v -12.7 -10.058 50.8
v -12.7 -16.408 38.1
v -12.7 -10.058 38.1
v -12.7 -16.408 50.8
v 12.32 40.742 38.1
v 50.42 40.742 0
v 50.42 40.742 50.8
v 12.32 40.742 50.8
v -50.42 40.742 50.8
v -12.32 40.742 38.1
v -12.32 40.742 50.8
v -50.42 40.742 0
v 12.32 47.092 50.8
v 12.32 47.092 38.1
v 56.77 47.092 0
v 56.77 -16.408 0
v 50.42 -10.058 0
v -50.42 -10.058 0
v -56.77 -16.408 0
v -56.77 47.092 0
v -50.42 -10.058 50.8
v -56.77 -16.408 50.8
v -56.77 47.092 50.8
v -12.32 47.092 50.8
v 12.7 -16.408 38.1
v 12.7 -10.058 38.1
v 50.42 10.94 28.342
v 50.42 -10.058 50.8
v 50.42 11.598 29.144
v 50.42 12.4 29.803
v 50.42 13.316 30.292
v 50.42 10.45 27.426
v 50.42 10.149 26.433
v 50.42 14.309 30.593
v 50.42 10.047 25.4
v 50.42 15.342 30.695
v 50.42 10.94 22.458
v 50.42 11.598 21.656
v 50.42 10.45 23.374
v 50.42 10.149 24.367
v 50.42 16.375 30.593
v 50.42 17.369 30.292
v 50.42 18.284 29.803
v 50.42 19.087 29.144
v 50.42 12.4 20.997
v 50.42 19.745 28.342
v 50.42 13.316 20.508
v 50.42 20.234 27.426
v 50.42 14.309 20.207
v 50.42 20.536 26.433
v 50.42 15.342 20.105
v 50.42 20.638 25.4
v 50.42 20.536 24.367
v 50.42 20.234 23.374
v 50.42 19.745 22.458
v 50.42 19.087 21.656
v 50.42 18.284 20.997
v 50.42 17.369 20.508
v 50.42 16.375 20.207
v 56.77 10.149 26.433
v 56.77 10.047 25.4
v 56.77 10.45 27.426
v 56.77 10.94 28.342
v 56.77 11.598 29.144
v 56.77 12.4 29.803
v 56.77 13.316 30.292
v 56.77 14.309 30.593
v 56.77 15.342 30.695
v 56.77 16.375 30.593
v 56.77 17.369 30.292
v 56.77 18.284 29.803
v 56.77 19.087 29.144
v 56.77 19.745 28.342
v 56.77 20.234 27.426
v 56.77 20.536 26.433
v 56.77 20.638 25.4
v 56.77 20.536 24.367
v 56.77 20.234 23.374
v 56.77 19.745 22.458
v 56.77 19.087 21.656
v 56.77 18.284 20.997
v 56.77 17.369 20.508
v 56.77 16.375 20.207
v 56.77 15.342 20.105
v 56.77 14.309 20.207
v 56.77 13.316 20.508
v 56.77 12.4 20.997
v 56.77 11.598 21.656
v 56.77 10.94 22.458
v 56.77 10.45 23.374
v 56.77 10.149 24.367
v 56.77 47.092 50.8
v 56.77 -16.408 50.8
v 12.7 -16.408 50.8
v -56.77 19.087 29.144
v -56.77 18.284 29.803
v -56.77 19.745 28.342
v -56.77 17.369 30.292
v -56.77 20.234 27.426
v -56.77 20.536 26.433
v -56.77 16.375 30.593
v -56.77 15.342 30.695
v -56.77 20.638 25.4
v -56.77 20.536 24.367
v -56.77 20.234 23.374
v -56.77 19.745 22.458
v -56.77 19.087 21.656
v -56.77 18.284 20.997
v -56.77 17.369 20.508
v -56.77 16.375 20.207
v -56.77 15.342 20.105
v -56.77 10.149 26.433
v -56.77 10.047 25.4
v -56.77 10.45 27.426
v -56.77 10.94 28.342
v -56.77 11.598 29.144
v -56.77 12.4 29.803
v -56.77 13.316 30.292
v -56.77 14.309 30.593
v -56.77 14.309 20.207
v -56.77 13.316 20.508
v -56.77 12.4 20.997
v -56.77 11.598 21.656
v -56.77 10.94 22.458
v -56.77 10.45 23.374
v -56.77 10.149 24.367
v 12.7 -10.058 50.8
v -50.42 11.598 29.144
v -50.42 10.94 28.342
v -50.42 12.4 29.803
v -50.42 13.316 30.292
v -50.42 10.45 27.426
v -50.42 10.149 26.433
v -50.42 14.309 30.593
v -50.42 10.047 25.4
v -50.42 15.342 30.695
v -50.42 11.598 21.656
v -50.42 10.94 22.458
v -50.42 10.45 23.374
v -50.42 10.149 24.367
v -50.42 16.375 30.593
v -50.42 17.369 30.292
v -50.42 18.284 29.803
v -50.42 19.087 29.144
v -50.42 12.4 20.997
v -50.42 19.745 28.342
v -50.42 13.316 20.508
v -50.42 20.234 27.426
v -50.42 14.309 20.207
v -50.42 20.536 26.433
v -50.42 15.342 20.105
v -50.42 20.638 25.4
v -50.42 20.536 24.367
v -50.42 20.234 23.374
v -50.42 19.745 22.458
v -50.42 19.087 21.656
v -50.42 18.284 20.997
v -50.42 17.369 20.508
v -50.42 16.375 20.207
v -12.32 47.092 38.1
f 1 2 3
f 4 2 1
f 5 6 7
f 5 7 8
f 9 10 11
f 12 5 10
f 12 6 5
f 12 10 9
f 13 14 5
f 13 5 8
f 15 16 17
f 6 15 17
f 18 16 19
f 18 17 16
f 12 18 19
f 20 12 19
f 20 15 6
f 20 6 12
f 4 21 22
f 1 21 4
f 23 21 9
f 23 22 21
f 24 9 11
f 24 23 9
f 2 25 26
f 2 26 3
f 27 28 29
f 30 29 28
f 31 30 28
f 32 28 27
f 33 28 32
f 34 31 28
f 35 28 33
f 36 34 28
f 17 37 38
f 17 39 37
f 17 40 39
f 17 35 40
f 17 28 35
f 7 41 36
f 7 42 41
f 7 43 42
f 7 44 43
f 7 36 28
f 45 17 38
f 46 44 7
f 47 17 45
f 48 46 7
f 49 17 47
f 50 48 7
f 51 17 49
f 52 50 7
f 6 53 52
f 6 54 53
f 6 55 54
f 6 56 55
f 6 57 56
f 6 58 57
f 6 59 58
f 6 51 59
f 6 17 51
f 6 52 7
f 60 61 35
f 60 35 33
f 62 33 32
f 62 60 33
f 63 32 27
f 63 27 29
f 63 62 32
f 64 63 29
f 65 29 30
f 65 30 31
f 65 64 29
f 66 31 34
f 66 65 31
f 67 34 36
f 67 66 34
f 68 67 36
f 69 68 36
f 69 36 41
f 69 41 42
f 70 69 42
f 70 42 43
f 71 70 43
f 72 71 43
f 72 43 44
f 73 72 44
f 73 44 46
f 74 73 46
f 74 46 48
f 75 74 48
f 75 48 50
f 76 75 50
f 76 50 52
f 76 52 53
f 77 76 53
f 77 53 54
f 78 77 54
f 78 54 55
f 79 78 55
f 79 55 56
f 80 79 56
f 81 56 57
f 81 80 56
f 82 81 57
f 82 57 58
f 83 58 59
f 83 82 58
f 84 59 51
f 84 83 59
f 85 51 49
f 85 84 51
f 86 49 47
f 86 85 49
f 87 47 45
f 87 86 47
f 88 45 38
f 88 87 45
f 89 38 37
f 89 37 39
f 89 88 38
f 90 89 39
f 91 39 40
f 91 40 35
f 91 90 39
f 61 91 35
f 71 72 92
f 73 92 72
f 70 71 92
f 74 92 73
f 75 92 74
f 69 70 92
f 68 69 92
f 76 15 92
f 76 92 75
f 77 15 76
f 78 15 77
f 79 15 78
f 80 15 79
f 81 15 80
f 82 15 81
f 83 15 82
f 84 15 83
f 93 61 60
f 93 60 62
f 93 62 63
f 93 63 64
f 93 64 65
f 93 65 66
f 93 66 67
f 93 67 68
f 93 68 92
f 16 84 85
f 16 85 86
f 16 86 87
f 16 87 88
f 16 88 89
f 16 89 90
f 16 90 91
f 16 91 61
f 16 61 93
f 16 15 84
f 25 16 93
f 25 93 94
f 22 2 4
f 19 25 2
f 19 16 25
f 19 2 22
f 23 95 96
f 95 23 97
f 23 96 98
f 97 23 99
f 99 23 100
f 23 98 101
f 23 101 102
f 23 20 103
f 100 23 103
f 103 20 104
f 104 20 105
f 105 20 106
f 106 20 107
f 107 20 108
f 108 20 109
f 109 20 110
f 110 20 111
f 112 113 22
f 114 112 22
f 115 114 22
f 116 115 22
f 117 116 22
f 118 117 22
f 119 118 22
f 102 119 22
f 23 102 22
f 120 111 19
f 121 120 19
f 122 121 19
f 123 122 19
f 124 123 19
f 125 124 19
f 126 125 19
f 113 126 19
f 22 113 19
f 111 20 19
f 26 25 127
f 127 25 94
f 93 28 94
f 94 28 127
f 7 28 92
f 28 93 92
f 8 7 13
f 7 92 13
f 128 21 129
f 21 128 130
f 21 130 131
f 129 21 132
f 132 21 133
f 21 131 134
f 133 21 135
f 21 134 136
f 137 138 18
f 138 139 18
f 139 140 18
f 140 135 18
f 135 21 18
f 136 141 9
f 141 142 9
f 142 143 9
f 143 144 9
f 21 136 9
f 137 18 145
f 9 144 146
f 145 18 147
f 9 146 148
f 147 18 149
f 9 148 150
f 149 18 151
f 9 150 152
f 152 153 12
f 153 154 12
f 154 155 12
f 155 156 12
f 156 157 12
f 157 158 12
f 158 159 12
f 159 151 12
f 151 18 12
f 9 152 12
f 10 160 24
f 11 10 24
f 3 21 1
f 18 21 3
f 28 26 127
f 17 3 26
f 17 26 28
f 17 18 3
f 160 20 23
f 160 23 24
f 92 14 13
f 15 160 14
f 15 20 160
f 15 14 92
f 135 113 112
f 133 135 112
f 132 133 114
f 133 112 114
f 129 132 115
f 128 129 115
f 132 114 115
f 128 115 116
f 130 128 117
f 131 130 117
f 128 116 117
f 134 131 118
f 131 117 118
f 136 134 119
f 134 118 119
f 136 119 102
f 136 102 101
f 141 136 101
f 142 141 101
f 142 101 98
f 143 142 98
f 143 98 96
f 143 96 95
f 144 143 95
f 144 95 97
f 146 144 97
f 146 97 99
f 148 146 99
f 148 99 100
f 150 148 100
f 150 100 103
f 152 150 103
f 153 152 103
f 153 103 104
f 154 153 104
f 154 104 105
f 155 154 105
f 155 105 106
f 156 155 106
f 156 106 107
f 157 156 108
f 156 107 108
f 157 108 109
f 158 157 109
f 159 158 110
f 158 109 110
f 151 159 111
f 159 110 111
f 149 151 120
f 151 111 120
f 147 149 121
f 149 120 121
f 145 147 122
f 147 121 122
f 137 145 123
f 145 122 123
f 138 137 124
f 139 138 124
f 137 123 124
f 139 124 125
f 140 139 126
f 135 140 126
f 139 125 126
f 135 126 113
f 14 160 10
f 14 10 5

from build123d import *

# Parameters (mm, degrees)
F1_DEPTH = 50.8
F2_W     = 12.7
F2_H     = 12.7
F4_DEPTH = 25.4
F3_W     = 12.7
F3_H     = 12.7
F5_DEPTH = 25.4
F6_R     = 5.295209
F7_DEPTH = 25.4


with BuildPart() as f1:
    # F0 (on Top) → F1 (new body)
    with BuildSketch(Plane.XY):
        Polygon((-50.420101, -10.057684), (-50.420101, 40.742316), (0.379899, 40.742316), (0.379899, 47.092316), (-56.770101, 47.092316), (-56.770101, 15.342316), (-56.770101, -16.407684), (0, -16.407684), (0, -10.057684), align=None)
    extrude(amount=F1_DEPTH)

    # F2 (on face) → F4 (cut)
    with BuildSketch(Plane.XZ.offset(16.407684)):
        with Locations((-6.35, 44.45)):
            Rectangle(F2_W, F2_H)
    extrude(amount=-F4_DEPTH, mode=Mode.SUBTRACT)

    # F3 (on face) → F5 (cut)
    with BuildSketch(Plane(origin=(0, 47.092316, 0), x_dir=(-1, 0, 0), z_dir=(0, 1, 0))):
        with Locations((5.970101, 44.45)):
            Rectangle(F3_W, F3_H)
    extrude(amount=-F5_DEPTH, mode=Mode.SUBTRACT)

    # F6 (on face) → F7 (cut)
    with BuildSketch(Plane(origin=(-56.770101, 0, 0), x_dir=(0, -1, 0), z_dir=(-1, 0, 0))):
        with Locations((-15.342316, 25.4)):
            Circle(F6_R)
    extrude(amount=-F7_DEPTH, mode=Mode.SUBTRACT)

    # F8: F1 across face


with BuildPart() as f1_1:
    add(f1.part)
    add(f1.part.mirror(Plane(origin=(0, -13.232684, 19.05), x_dir=(0, 1, 0), z_dir=(1, 0, 0))))


solid = f1_1.part
